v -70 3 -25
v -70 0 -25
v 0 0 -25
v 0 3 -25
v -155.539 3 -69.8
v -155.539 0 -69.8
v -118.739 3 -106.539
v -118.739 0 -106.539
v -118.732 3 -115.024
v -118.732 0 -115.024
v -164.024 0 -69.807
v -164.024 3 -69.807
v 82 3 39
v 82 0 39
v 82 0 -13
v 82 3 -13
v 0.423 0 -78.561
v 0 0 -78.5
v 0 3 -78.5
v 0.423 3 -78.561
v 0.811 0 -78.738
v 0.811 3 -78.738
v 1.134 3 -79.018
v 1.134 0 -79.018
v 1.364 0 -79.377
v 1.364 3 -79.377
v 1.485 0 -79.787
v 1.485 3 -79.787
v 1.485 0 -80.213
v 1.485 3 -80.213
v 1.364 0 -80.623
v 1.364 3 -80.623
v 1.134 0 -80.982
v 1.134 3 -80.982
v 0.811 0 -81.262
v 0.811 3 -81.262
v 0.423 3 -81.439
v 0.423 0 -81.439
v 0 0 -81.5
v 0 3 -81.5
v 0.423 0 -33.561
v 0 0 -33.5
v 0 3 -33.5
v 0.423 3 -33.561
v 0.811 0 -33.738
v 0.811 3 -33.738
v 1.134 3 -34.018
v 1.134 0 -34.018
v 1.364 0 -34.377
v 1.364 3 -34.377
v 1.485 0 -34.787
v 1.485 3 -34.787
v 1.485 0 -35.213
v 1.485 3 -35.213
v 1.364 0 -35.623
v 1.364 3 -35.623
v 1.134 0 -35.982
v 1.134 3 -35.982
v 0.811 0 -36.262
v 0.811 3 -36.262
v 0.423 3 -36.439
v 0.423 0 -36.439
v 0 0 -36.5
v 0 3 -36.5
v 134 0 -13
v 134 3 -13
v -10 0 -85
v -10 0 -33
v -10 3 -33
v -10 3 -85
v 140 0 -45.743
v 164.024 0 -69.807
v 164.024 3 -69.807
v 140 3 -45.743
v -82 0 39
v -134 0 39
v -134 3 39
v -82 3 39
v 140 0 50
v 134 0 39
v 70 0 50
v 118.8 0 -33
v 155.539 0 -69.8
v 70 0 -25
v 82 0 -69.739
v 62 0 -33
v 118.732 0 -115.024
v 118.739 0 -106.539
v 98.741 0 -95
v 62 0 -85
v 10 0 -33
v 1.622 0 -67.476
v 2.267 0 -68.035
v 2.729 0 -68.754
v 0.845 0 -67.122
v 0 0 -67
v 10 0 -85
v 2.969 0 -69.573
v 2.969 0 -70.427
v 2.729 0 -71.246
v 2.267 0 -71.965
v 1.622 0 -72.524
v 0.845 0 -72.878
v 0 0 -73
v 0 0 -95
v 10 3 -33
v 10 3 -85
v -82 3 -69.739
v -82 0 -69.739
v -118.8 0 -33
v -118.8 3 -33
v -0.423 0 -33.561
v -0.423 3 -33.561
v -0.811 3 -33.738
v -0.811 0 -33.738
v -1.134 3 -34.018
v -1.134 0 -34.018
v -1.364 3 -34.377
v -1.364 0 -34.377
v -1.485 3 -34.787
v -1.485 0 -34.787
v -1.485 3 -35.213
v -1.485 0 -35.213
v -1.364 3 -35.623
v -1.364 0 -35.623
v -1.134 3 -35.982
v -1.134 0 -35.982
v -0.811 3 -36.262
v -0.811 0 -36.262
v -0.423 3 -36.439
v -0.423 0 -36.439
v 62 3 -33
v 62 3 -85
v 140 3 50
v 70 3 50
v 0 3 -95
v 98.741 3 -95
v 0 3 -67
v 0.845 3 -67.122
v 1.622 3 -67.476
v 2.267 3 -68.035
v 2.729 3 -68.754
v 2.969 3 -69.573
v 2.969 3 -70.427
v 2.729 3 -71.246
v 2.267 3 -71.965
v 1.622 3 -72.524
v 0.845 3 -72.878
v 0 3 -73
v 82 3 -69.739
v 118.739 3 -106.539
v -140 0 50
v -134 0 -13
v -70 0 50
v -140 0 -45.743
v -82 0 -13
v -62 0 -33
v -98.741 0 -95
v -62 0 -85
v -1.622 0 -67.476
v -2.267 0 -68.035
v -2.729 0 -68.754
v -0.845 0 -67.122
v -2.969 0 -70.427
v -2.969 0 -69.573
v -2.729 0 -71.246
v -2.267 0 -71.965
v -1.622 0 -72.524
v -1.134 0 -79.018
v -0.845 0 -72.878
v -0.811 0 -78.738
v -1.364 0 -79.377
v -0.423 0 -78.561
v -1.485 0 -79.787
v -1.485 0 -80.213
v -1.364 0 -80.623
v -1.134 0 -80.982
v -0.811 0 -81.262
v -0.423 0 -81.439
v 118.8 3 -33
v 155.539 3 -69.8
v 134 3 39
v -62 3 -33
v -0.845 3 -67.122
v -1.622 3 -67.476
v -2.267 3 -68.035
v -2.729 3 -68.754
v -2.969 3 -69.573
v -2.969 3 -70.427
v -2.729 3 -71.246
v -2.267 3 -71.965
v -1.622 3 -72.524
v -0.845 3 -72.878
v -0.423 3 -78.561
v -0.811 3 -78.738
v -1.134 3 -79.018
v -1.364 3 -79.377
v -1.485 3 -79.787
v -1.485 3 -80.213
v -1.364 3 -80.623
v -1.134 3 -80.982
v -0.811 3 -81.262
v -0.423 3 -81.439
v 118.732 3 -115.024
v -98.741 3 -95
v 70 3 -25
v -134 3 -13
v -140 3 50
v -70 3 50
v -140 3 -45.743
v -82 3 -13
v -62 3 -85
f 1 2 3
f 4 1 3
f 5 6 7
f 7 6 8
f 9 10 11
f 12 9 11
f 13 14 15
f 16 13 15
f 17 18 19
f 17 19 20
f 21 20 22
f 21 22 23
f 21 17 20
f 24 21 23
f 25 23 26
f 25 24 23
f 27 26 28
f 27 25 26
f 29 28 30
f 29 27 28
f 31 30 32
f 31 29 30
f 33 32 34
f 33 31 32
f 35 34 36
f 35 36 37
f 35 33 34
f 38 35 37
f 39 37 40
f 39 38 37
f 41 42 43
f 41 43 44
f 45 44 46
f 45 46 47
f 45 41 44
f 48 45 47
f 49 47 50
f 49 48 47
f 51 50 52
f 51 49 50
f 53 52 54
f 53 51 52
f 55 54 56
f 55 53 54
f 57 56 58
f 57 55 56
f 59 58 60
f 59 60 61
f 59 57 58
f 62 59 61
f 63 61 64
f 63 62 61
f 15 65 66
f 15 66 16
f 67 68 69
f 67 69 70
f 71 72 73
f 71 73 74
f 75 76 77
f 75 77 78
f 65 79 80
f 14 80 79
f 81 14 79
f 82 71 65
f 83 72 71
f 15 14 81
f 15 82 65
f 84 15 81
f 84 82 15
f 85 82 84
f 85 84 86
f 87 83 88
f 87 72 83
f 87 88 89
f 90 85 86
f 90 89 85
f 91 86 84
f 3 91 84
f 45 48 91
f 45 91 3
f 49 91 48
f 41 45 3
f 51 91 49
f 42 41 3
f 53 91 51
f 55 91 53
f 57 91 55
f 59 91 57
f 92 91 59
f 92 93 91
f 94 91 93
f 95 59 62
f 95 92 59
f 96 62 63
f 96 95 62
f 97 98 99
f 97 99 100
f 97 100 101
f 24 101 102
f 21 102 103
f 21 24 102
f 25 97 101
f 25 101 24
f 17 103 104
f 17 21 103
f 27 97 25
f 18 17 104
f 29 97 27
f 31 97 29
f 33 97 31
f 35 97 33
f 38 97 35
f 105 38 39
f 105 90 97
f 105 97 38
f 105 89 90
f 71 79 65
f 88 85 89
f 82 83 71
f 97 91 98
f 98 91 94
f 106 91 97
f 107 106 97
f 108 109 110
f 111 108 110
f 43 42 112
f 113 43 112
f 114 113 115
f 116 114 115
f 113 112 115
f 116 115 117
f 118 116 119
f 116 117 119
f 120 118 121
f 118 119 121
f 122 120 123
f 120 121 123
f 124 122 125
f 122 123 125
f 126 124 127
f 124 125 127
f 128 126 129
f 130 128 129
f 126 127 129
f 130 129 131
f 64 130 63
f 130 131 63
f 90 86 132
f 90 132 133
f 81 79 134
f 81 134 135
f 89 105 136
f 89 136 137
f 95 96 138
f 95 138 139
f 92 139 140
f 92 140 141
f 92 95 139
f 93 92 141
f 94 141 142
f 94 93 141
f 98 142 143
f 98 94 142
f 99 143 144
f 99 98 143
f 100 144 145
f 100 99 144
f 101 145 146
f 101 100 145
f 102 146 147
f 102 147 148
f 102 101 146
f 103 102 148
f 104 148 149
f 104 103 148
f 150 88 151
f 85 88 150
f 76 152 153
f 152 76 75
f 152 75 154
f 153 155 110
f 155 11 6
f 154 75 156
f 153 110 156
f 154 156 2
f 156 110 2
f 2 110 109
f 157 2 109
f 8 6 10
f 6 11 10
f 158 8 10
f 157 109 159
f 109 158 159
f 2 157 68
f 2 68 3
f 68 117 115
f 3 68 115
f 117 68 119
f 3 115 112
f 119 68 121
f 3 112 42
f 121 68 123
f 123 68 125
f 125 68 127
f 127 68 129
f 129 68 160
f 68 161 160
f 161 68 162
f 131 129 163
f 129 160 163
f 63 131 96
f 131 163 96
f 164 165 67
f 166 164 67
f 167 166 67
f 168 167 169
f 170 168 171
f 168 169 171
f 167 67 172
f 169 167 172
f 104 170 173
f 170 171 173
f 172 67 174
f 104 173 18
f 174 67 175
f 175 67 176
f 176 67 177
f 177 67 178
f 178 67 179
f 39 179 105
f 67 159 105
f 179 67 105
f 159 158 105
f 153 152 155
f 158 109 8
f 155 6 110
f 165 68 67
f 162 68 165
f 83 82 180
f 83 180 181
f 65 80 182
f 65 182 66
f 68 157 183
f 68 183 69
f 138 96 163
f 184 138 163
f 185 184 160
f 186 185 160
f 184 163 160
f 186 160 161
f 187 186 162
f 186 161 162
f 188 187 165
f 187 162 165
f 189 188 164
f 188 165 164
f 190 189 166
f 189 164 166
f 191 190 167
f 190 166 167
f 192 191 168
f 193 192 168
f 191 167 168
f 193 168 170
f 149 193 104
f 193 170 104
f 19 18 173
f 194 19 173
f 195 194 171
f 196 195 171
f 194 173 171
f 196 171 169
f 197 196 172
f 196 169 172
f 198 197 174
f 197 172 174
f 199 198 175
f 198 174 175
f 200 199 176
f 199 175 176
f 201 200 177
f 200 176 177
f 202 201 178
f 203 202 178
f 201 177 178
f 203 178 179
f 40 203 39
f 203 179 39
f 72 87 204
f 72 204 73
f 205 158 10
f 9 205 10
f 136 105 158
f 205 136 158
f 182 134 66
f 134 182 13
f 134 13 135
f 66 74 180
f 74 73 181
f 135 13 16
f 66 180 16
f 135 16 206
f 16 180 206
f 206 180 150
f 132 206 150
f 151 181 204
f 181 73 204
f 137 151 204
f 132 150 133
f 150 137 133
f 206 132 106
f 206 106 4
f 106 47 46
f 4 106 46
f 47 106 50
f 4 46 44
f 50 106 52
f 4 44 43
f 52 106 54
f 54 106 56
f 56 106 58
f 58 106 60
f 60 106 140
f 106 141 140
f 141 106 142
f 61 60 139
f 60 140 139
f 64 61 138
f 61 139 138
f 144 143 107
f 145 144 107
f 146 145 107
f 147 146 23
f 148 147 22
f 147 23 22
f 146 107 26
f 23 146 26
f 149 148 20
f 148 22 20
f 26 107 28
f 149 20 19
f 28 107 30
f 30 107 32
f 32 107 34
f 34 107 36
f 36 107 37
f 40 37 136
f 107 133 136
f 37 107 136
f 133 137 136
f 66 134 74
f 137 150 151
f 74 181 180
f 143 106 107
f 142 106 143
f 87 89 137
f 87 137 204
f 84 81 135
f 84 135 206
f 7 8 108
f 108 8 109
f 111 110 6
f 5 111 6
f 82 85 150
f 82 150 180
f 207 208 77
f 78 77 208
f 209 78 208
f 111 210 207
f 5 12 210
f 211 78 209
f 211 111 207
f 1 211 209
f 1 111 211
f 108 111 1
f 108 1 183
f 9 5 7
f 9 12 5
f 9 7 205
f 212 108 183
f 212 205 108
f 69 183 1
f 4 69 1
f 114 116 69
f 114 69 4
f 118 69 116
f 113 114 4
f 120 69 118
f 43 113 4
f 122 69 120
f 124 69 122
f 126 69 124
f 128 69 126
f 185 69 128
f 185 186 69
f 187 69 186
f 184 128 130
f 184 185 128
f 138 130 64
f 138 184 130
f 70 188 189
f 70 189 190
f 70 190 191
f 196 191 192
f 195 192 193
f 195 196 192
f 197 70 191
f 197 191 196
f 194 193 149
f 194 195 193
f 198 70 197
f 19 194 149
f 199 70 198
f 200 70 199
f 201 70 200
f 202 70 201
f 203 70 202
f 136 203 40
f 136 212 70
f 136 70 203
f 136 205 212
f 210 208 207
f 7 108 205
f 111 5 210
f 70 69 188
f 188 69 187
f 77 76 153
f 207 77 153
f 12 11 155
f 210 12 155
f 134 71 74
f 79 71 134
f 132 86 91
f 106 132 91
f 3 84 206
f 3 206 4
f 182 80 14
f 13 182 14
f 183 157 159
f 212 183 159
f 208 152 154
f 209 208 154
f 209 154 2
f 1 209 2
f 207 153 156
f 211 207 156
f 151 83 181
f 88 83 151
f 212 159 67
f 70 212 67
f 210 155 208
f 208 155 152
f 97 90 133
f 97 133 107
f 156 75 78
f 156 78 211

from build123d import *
from build123d.topology import SkipClean

# Parameters (mm, degrees)
SKETCH_1_W      = 52
SKETCH_1_H      = 52
EXTRUDE_1_DEPTH = 3


with BuildPart() as part:
    # 草图1 → 凸台-拉伸1 (new body)
    with BuildSketch(Plane(origin=(0, 0, 0), x_dir=(1, 0, 0), z_dir=(0, 1, 0))):
        with BuildLine():
            Line((-140, -50), (-70, -50))
            Line((-70, -50), (-70, 25))
            Line((-70, 25), (0, 25))
            Line((0, 25), (0, 33.5))
            ThreePointArc((0, 33.5), (-1.5, 35), (0, 36.5))
            Line((0, 36.5), (0, 67))
            ThreePointArc((0, 67), (-3, 70), (0, 73))
            Line((0, 73), (0, 78.5))
            ThreePointArc((0, 78.5), (-1.5, 80), (0, 81.5))
            Line((0, 81.5), (0, 95))
            Line((0, 95), (-98.740841322, 95))
            Line((-98.740841322, 95), (-118.732050781, 115.024358473))
            Line((-118.732050781, 115.024358473), (-164.024358473, 69.80702923))
            Line((-164.024358473, 69.80702923), (-140, 45.742834058))
            Line((-140, 45.742834058), (-140, -50))
        make_face()
        Polygon((-82, 69.73908001), (-118.8, 33), (-155.53908001, 69.8), (-118.73908001, 106.53908001), align=None, mode=Mode.SUBTRACT)
        with Locations((-36, 59)):
            Rectangle(SKETCH_1_W, SKETCH_1_H, mode=Mode.SUBTRACT)
        with Locations((-108, -13)):
            Rectangle(SKETCH_1_W, SKETCH_1_H, mode=Mode.SUBTRACT)
    extrude_1 = extrude(amount=EXTRUDE_1_DEPTH)

    # 镜向1: 凸台-拉伸1 across plane
    with SkipClean():  # the faces are left unmerged after this step: merging them gives an invalid solid
        add(extrude_1.mirror(Plane(origin=(0, 3, -36.5), x_dir=(0, 0, 1), z_dir=(-1, 0, 0))))


solid = part.part
